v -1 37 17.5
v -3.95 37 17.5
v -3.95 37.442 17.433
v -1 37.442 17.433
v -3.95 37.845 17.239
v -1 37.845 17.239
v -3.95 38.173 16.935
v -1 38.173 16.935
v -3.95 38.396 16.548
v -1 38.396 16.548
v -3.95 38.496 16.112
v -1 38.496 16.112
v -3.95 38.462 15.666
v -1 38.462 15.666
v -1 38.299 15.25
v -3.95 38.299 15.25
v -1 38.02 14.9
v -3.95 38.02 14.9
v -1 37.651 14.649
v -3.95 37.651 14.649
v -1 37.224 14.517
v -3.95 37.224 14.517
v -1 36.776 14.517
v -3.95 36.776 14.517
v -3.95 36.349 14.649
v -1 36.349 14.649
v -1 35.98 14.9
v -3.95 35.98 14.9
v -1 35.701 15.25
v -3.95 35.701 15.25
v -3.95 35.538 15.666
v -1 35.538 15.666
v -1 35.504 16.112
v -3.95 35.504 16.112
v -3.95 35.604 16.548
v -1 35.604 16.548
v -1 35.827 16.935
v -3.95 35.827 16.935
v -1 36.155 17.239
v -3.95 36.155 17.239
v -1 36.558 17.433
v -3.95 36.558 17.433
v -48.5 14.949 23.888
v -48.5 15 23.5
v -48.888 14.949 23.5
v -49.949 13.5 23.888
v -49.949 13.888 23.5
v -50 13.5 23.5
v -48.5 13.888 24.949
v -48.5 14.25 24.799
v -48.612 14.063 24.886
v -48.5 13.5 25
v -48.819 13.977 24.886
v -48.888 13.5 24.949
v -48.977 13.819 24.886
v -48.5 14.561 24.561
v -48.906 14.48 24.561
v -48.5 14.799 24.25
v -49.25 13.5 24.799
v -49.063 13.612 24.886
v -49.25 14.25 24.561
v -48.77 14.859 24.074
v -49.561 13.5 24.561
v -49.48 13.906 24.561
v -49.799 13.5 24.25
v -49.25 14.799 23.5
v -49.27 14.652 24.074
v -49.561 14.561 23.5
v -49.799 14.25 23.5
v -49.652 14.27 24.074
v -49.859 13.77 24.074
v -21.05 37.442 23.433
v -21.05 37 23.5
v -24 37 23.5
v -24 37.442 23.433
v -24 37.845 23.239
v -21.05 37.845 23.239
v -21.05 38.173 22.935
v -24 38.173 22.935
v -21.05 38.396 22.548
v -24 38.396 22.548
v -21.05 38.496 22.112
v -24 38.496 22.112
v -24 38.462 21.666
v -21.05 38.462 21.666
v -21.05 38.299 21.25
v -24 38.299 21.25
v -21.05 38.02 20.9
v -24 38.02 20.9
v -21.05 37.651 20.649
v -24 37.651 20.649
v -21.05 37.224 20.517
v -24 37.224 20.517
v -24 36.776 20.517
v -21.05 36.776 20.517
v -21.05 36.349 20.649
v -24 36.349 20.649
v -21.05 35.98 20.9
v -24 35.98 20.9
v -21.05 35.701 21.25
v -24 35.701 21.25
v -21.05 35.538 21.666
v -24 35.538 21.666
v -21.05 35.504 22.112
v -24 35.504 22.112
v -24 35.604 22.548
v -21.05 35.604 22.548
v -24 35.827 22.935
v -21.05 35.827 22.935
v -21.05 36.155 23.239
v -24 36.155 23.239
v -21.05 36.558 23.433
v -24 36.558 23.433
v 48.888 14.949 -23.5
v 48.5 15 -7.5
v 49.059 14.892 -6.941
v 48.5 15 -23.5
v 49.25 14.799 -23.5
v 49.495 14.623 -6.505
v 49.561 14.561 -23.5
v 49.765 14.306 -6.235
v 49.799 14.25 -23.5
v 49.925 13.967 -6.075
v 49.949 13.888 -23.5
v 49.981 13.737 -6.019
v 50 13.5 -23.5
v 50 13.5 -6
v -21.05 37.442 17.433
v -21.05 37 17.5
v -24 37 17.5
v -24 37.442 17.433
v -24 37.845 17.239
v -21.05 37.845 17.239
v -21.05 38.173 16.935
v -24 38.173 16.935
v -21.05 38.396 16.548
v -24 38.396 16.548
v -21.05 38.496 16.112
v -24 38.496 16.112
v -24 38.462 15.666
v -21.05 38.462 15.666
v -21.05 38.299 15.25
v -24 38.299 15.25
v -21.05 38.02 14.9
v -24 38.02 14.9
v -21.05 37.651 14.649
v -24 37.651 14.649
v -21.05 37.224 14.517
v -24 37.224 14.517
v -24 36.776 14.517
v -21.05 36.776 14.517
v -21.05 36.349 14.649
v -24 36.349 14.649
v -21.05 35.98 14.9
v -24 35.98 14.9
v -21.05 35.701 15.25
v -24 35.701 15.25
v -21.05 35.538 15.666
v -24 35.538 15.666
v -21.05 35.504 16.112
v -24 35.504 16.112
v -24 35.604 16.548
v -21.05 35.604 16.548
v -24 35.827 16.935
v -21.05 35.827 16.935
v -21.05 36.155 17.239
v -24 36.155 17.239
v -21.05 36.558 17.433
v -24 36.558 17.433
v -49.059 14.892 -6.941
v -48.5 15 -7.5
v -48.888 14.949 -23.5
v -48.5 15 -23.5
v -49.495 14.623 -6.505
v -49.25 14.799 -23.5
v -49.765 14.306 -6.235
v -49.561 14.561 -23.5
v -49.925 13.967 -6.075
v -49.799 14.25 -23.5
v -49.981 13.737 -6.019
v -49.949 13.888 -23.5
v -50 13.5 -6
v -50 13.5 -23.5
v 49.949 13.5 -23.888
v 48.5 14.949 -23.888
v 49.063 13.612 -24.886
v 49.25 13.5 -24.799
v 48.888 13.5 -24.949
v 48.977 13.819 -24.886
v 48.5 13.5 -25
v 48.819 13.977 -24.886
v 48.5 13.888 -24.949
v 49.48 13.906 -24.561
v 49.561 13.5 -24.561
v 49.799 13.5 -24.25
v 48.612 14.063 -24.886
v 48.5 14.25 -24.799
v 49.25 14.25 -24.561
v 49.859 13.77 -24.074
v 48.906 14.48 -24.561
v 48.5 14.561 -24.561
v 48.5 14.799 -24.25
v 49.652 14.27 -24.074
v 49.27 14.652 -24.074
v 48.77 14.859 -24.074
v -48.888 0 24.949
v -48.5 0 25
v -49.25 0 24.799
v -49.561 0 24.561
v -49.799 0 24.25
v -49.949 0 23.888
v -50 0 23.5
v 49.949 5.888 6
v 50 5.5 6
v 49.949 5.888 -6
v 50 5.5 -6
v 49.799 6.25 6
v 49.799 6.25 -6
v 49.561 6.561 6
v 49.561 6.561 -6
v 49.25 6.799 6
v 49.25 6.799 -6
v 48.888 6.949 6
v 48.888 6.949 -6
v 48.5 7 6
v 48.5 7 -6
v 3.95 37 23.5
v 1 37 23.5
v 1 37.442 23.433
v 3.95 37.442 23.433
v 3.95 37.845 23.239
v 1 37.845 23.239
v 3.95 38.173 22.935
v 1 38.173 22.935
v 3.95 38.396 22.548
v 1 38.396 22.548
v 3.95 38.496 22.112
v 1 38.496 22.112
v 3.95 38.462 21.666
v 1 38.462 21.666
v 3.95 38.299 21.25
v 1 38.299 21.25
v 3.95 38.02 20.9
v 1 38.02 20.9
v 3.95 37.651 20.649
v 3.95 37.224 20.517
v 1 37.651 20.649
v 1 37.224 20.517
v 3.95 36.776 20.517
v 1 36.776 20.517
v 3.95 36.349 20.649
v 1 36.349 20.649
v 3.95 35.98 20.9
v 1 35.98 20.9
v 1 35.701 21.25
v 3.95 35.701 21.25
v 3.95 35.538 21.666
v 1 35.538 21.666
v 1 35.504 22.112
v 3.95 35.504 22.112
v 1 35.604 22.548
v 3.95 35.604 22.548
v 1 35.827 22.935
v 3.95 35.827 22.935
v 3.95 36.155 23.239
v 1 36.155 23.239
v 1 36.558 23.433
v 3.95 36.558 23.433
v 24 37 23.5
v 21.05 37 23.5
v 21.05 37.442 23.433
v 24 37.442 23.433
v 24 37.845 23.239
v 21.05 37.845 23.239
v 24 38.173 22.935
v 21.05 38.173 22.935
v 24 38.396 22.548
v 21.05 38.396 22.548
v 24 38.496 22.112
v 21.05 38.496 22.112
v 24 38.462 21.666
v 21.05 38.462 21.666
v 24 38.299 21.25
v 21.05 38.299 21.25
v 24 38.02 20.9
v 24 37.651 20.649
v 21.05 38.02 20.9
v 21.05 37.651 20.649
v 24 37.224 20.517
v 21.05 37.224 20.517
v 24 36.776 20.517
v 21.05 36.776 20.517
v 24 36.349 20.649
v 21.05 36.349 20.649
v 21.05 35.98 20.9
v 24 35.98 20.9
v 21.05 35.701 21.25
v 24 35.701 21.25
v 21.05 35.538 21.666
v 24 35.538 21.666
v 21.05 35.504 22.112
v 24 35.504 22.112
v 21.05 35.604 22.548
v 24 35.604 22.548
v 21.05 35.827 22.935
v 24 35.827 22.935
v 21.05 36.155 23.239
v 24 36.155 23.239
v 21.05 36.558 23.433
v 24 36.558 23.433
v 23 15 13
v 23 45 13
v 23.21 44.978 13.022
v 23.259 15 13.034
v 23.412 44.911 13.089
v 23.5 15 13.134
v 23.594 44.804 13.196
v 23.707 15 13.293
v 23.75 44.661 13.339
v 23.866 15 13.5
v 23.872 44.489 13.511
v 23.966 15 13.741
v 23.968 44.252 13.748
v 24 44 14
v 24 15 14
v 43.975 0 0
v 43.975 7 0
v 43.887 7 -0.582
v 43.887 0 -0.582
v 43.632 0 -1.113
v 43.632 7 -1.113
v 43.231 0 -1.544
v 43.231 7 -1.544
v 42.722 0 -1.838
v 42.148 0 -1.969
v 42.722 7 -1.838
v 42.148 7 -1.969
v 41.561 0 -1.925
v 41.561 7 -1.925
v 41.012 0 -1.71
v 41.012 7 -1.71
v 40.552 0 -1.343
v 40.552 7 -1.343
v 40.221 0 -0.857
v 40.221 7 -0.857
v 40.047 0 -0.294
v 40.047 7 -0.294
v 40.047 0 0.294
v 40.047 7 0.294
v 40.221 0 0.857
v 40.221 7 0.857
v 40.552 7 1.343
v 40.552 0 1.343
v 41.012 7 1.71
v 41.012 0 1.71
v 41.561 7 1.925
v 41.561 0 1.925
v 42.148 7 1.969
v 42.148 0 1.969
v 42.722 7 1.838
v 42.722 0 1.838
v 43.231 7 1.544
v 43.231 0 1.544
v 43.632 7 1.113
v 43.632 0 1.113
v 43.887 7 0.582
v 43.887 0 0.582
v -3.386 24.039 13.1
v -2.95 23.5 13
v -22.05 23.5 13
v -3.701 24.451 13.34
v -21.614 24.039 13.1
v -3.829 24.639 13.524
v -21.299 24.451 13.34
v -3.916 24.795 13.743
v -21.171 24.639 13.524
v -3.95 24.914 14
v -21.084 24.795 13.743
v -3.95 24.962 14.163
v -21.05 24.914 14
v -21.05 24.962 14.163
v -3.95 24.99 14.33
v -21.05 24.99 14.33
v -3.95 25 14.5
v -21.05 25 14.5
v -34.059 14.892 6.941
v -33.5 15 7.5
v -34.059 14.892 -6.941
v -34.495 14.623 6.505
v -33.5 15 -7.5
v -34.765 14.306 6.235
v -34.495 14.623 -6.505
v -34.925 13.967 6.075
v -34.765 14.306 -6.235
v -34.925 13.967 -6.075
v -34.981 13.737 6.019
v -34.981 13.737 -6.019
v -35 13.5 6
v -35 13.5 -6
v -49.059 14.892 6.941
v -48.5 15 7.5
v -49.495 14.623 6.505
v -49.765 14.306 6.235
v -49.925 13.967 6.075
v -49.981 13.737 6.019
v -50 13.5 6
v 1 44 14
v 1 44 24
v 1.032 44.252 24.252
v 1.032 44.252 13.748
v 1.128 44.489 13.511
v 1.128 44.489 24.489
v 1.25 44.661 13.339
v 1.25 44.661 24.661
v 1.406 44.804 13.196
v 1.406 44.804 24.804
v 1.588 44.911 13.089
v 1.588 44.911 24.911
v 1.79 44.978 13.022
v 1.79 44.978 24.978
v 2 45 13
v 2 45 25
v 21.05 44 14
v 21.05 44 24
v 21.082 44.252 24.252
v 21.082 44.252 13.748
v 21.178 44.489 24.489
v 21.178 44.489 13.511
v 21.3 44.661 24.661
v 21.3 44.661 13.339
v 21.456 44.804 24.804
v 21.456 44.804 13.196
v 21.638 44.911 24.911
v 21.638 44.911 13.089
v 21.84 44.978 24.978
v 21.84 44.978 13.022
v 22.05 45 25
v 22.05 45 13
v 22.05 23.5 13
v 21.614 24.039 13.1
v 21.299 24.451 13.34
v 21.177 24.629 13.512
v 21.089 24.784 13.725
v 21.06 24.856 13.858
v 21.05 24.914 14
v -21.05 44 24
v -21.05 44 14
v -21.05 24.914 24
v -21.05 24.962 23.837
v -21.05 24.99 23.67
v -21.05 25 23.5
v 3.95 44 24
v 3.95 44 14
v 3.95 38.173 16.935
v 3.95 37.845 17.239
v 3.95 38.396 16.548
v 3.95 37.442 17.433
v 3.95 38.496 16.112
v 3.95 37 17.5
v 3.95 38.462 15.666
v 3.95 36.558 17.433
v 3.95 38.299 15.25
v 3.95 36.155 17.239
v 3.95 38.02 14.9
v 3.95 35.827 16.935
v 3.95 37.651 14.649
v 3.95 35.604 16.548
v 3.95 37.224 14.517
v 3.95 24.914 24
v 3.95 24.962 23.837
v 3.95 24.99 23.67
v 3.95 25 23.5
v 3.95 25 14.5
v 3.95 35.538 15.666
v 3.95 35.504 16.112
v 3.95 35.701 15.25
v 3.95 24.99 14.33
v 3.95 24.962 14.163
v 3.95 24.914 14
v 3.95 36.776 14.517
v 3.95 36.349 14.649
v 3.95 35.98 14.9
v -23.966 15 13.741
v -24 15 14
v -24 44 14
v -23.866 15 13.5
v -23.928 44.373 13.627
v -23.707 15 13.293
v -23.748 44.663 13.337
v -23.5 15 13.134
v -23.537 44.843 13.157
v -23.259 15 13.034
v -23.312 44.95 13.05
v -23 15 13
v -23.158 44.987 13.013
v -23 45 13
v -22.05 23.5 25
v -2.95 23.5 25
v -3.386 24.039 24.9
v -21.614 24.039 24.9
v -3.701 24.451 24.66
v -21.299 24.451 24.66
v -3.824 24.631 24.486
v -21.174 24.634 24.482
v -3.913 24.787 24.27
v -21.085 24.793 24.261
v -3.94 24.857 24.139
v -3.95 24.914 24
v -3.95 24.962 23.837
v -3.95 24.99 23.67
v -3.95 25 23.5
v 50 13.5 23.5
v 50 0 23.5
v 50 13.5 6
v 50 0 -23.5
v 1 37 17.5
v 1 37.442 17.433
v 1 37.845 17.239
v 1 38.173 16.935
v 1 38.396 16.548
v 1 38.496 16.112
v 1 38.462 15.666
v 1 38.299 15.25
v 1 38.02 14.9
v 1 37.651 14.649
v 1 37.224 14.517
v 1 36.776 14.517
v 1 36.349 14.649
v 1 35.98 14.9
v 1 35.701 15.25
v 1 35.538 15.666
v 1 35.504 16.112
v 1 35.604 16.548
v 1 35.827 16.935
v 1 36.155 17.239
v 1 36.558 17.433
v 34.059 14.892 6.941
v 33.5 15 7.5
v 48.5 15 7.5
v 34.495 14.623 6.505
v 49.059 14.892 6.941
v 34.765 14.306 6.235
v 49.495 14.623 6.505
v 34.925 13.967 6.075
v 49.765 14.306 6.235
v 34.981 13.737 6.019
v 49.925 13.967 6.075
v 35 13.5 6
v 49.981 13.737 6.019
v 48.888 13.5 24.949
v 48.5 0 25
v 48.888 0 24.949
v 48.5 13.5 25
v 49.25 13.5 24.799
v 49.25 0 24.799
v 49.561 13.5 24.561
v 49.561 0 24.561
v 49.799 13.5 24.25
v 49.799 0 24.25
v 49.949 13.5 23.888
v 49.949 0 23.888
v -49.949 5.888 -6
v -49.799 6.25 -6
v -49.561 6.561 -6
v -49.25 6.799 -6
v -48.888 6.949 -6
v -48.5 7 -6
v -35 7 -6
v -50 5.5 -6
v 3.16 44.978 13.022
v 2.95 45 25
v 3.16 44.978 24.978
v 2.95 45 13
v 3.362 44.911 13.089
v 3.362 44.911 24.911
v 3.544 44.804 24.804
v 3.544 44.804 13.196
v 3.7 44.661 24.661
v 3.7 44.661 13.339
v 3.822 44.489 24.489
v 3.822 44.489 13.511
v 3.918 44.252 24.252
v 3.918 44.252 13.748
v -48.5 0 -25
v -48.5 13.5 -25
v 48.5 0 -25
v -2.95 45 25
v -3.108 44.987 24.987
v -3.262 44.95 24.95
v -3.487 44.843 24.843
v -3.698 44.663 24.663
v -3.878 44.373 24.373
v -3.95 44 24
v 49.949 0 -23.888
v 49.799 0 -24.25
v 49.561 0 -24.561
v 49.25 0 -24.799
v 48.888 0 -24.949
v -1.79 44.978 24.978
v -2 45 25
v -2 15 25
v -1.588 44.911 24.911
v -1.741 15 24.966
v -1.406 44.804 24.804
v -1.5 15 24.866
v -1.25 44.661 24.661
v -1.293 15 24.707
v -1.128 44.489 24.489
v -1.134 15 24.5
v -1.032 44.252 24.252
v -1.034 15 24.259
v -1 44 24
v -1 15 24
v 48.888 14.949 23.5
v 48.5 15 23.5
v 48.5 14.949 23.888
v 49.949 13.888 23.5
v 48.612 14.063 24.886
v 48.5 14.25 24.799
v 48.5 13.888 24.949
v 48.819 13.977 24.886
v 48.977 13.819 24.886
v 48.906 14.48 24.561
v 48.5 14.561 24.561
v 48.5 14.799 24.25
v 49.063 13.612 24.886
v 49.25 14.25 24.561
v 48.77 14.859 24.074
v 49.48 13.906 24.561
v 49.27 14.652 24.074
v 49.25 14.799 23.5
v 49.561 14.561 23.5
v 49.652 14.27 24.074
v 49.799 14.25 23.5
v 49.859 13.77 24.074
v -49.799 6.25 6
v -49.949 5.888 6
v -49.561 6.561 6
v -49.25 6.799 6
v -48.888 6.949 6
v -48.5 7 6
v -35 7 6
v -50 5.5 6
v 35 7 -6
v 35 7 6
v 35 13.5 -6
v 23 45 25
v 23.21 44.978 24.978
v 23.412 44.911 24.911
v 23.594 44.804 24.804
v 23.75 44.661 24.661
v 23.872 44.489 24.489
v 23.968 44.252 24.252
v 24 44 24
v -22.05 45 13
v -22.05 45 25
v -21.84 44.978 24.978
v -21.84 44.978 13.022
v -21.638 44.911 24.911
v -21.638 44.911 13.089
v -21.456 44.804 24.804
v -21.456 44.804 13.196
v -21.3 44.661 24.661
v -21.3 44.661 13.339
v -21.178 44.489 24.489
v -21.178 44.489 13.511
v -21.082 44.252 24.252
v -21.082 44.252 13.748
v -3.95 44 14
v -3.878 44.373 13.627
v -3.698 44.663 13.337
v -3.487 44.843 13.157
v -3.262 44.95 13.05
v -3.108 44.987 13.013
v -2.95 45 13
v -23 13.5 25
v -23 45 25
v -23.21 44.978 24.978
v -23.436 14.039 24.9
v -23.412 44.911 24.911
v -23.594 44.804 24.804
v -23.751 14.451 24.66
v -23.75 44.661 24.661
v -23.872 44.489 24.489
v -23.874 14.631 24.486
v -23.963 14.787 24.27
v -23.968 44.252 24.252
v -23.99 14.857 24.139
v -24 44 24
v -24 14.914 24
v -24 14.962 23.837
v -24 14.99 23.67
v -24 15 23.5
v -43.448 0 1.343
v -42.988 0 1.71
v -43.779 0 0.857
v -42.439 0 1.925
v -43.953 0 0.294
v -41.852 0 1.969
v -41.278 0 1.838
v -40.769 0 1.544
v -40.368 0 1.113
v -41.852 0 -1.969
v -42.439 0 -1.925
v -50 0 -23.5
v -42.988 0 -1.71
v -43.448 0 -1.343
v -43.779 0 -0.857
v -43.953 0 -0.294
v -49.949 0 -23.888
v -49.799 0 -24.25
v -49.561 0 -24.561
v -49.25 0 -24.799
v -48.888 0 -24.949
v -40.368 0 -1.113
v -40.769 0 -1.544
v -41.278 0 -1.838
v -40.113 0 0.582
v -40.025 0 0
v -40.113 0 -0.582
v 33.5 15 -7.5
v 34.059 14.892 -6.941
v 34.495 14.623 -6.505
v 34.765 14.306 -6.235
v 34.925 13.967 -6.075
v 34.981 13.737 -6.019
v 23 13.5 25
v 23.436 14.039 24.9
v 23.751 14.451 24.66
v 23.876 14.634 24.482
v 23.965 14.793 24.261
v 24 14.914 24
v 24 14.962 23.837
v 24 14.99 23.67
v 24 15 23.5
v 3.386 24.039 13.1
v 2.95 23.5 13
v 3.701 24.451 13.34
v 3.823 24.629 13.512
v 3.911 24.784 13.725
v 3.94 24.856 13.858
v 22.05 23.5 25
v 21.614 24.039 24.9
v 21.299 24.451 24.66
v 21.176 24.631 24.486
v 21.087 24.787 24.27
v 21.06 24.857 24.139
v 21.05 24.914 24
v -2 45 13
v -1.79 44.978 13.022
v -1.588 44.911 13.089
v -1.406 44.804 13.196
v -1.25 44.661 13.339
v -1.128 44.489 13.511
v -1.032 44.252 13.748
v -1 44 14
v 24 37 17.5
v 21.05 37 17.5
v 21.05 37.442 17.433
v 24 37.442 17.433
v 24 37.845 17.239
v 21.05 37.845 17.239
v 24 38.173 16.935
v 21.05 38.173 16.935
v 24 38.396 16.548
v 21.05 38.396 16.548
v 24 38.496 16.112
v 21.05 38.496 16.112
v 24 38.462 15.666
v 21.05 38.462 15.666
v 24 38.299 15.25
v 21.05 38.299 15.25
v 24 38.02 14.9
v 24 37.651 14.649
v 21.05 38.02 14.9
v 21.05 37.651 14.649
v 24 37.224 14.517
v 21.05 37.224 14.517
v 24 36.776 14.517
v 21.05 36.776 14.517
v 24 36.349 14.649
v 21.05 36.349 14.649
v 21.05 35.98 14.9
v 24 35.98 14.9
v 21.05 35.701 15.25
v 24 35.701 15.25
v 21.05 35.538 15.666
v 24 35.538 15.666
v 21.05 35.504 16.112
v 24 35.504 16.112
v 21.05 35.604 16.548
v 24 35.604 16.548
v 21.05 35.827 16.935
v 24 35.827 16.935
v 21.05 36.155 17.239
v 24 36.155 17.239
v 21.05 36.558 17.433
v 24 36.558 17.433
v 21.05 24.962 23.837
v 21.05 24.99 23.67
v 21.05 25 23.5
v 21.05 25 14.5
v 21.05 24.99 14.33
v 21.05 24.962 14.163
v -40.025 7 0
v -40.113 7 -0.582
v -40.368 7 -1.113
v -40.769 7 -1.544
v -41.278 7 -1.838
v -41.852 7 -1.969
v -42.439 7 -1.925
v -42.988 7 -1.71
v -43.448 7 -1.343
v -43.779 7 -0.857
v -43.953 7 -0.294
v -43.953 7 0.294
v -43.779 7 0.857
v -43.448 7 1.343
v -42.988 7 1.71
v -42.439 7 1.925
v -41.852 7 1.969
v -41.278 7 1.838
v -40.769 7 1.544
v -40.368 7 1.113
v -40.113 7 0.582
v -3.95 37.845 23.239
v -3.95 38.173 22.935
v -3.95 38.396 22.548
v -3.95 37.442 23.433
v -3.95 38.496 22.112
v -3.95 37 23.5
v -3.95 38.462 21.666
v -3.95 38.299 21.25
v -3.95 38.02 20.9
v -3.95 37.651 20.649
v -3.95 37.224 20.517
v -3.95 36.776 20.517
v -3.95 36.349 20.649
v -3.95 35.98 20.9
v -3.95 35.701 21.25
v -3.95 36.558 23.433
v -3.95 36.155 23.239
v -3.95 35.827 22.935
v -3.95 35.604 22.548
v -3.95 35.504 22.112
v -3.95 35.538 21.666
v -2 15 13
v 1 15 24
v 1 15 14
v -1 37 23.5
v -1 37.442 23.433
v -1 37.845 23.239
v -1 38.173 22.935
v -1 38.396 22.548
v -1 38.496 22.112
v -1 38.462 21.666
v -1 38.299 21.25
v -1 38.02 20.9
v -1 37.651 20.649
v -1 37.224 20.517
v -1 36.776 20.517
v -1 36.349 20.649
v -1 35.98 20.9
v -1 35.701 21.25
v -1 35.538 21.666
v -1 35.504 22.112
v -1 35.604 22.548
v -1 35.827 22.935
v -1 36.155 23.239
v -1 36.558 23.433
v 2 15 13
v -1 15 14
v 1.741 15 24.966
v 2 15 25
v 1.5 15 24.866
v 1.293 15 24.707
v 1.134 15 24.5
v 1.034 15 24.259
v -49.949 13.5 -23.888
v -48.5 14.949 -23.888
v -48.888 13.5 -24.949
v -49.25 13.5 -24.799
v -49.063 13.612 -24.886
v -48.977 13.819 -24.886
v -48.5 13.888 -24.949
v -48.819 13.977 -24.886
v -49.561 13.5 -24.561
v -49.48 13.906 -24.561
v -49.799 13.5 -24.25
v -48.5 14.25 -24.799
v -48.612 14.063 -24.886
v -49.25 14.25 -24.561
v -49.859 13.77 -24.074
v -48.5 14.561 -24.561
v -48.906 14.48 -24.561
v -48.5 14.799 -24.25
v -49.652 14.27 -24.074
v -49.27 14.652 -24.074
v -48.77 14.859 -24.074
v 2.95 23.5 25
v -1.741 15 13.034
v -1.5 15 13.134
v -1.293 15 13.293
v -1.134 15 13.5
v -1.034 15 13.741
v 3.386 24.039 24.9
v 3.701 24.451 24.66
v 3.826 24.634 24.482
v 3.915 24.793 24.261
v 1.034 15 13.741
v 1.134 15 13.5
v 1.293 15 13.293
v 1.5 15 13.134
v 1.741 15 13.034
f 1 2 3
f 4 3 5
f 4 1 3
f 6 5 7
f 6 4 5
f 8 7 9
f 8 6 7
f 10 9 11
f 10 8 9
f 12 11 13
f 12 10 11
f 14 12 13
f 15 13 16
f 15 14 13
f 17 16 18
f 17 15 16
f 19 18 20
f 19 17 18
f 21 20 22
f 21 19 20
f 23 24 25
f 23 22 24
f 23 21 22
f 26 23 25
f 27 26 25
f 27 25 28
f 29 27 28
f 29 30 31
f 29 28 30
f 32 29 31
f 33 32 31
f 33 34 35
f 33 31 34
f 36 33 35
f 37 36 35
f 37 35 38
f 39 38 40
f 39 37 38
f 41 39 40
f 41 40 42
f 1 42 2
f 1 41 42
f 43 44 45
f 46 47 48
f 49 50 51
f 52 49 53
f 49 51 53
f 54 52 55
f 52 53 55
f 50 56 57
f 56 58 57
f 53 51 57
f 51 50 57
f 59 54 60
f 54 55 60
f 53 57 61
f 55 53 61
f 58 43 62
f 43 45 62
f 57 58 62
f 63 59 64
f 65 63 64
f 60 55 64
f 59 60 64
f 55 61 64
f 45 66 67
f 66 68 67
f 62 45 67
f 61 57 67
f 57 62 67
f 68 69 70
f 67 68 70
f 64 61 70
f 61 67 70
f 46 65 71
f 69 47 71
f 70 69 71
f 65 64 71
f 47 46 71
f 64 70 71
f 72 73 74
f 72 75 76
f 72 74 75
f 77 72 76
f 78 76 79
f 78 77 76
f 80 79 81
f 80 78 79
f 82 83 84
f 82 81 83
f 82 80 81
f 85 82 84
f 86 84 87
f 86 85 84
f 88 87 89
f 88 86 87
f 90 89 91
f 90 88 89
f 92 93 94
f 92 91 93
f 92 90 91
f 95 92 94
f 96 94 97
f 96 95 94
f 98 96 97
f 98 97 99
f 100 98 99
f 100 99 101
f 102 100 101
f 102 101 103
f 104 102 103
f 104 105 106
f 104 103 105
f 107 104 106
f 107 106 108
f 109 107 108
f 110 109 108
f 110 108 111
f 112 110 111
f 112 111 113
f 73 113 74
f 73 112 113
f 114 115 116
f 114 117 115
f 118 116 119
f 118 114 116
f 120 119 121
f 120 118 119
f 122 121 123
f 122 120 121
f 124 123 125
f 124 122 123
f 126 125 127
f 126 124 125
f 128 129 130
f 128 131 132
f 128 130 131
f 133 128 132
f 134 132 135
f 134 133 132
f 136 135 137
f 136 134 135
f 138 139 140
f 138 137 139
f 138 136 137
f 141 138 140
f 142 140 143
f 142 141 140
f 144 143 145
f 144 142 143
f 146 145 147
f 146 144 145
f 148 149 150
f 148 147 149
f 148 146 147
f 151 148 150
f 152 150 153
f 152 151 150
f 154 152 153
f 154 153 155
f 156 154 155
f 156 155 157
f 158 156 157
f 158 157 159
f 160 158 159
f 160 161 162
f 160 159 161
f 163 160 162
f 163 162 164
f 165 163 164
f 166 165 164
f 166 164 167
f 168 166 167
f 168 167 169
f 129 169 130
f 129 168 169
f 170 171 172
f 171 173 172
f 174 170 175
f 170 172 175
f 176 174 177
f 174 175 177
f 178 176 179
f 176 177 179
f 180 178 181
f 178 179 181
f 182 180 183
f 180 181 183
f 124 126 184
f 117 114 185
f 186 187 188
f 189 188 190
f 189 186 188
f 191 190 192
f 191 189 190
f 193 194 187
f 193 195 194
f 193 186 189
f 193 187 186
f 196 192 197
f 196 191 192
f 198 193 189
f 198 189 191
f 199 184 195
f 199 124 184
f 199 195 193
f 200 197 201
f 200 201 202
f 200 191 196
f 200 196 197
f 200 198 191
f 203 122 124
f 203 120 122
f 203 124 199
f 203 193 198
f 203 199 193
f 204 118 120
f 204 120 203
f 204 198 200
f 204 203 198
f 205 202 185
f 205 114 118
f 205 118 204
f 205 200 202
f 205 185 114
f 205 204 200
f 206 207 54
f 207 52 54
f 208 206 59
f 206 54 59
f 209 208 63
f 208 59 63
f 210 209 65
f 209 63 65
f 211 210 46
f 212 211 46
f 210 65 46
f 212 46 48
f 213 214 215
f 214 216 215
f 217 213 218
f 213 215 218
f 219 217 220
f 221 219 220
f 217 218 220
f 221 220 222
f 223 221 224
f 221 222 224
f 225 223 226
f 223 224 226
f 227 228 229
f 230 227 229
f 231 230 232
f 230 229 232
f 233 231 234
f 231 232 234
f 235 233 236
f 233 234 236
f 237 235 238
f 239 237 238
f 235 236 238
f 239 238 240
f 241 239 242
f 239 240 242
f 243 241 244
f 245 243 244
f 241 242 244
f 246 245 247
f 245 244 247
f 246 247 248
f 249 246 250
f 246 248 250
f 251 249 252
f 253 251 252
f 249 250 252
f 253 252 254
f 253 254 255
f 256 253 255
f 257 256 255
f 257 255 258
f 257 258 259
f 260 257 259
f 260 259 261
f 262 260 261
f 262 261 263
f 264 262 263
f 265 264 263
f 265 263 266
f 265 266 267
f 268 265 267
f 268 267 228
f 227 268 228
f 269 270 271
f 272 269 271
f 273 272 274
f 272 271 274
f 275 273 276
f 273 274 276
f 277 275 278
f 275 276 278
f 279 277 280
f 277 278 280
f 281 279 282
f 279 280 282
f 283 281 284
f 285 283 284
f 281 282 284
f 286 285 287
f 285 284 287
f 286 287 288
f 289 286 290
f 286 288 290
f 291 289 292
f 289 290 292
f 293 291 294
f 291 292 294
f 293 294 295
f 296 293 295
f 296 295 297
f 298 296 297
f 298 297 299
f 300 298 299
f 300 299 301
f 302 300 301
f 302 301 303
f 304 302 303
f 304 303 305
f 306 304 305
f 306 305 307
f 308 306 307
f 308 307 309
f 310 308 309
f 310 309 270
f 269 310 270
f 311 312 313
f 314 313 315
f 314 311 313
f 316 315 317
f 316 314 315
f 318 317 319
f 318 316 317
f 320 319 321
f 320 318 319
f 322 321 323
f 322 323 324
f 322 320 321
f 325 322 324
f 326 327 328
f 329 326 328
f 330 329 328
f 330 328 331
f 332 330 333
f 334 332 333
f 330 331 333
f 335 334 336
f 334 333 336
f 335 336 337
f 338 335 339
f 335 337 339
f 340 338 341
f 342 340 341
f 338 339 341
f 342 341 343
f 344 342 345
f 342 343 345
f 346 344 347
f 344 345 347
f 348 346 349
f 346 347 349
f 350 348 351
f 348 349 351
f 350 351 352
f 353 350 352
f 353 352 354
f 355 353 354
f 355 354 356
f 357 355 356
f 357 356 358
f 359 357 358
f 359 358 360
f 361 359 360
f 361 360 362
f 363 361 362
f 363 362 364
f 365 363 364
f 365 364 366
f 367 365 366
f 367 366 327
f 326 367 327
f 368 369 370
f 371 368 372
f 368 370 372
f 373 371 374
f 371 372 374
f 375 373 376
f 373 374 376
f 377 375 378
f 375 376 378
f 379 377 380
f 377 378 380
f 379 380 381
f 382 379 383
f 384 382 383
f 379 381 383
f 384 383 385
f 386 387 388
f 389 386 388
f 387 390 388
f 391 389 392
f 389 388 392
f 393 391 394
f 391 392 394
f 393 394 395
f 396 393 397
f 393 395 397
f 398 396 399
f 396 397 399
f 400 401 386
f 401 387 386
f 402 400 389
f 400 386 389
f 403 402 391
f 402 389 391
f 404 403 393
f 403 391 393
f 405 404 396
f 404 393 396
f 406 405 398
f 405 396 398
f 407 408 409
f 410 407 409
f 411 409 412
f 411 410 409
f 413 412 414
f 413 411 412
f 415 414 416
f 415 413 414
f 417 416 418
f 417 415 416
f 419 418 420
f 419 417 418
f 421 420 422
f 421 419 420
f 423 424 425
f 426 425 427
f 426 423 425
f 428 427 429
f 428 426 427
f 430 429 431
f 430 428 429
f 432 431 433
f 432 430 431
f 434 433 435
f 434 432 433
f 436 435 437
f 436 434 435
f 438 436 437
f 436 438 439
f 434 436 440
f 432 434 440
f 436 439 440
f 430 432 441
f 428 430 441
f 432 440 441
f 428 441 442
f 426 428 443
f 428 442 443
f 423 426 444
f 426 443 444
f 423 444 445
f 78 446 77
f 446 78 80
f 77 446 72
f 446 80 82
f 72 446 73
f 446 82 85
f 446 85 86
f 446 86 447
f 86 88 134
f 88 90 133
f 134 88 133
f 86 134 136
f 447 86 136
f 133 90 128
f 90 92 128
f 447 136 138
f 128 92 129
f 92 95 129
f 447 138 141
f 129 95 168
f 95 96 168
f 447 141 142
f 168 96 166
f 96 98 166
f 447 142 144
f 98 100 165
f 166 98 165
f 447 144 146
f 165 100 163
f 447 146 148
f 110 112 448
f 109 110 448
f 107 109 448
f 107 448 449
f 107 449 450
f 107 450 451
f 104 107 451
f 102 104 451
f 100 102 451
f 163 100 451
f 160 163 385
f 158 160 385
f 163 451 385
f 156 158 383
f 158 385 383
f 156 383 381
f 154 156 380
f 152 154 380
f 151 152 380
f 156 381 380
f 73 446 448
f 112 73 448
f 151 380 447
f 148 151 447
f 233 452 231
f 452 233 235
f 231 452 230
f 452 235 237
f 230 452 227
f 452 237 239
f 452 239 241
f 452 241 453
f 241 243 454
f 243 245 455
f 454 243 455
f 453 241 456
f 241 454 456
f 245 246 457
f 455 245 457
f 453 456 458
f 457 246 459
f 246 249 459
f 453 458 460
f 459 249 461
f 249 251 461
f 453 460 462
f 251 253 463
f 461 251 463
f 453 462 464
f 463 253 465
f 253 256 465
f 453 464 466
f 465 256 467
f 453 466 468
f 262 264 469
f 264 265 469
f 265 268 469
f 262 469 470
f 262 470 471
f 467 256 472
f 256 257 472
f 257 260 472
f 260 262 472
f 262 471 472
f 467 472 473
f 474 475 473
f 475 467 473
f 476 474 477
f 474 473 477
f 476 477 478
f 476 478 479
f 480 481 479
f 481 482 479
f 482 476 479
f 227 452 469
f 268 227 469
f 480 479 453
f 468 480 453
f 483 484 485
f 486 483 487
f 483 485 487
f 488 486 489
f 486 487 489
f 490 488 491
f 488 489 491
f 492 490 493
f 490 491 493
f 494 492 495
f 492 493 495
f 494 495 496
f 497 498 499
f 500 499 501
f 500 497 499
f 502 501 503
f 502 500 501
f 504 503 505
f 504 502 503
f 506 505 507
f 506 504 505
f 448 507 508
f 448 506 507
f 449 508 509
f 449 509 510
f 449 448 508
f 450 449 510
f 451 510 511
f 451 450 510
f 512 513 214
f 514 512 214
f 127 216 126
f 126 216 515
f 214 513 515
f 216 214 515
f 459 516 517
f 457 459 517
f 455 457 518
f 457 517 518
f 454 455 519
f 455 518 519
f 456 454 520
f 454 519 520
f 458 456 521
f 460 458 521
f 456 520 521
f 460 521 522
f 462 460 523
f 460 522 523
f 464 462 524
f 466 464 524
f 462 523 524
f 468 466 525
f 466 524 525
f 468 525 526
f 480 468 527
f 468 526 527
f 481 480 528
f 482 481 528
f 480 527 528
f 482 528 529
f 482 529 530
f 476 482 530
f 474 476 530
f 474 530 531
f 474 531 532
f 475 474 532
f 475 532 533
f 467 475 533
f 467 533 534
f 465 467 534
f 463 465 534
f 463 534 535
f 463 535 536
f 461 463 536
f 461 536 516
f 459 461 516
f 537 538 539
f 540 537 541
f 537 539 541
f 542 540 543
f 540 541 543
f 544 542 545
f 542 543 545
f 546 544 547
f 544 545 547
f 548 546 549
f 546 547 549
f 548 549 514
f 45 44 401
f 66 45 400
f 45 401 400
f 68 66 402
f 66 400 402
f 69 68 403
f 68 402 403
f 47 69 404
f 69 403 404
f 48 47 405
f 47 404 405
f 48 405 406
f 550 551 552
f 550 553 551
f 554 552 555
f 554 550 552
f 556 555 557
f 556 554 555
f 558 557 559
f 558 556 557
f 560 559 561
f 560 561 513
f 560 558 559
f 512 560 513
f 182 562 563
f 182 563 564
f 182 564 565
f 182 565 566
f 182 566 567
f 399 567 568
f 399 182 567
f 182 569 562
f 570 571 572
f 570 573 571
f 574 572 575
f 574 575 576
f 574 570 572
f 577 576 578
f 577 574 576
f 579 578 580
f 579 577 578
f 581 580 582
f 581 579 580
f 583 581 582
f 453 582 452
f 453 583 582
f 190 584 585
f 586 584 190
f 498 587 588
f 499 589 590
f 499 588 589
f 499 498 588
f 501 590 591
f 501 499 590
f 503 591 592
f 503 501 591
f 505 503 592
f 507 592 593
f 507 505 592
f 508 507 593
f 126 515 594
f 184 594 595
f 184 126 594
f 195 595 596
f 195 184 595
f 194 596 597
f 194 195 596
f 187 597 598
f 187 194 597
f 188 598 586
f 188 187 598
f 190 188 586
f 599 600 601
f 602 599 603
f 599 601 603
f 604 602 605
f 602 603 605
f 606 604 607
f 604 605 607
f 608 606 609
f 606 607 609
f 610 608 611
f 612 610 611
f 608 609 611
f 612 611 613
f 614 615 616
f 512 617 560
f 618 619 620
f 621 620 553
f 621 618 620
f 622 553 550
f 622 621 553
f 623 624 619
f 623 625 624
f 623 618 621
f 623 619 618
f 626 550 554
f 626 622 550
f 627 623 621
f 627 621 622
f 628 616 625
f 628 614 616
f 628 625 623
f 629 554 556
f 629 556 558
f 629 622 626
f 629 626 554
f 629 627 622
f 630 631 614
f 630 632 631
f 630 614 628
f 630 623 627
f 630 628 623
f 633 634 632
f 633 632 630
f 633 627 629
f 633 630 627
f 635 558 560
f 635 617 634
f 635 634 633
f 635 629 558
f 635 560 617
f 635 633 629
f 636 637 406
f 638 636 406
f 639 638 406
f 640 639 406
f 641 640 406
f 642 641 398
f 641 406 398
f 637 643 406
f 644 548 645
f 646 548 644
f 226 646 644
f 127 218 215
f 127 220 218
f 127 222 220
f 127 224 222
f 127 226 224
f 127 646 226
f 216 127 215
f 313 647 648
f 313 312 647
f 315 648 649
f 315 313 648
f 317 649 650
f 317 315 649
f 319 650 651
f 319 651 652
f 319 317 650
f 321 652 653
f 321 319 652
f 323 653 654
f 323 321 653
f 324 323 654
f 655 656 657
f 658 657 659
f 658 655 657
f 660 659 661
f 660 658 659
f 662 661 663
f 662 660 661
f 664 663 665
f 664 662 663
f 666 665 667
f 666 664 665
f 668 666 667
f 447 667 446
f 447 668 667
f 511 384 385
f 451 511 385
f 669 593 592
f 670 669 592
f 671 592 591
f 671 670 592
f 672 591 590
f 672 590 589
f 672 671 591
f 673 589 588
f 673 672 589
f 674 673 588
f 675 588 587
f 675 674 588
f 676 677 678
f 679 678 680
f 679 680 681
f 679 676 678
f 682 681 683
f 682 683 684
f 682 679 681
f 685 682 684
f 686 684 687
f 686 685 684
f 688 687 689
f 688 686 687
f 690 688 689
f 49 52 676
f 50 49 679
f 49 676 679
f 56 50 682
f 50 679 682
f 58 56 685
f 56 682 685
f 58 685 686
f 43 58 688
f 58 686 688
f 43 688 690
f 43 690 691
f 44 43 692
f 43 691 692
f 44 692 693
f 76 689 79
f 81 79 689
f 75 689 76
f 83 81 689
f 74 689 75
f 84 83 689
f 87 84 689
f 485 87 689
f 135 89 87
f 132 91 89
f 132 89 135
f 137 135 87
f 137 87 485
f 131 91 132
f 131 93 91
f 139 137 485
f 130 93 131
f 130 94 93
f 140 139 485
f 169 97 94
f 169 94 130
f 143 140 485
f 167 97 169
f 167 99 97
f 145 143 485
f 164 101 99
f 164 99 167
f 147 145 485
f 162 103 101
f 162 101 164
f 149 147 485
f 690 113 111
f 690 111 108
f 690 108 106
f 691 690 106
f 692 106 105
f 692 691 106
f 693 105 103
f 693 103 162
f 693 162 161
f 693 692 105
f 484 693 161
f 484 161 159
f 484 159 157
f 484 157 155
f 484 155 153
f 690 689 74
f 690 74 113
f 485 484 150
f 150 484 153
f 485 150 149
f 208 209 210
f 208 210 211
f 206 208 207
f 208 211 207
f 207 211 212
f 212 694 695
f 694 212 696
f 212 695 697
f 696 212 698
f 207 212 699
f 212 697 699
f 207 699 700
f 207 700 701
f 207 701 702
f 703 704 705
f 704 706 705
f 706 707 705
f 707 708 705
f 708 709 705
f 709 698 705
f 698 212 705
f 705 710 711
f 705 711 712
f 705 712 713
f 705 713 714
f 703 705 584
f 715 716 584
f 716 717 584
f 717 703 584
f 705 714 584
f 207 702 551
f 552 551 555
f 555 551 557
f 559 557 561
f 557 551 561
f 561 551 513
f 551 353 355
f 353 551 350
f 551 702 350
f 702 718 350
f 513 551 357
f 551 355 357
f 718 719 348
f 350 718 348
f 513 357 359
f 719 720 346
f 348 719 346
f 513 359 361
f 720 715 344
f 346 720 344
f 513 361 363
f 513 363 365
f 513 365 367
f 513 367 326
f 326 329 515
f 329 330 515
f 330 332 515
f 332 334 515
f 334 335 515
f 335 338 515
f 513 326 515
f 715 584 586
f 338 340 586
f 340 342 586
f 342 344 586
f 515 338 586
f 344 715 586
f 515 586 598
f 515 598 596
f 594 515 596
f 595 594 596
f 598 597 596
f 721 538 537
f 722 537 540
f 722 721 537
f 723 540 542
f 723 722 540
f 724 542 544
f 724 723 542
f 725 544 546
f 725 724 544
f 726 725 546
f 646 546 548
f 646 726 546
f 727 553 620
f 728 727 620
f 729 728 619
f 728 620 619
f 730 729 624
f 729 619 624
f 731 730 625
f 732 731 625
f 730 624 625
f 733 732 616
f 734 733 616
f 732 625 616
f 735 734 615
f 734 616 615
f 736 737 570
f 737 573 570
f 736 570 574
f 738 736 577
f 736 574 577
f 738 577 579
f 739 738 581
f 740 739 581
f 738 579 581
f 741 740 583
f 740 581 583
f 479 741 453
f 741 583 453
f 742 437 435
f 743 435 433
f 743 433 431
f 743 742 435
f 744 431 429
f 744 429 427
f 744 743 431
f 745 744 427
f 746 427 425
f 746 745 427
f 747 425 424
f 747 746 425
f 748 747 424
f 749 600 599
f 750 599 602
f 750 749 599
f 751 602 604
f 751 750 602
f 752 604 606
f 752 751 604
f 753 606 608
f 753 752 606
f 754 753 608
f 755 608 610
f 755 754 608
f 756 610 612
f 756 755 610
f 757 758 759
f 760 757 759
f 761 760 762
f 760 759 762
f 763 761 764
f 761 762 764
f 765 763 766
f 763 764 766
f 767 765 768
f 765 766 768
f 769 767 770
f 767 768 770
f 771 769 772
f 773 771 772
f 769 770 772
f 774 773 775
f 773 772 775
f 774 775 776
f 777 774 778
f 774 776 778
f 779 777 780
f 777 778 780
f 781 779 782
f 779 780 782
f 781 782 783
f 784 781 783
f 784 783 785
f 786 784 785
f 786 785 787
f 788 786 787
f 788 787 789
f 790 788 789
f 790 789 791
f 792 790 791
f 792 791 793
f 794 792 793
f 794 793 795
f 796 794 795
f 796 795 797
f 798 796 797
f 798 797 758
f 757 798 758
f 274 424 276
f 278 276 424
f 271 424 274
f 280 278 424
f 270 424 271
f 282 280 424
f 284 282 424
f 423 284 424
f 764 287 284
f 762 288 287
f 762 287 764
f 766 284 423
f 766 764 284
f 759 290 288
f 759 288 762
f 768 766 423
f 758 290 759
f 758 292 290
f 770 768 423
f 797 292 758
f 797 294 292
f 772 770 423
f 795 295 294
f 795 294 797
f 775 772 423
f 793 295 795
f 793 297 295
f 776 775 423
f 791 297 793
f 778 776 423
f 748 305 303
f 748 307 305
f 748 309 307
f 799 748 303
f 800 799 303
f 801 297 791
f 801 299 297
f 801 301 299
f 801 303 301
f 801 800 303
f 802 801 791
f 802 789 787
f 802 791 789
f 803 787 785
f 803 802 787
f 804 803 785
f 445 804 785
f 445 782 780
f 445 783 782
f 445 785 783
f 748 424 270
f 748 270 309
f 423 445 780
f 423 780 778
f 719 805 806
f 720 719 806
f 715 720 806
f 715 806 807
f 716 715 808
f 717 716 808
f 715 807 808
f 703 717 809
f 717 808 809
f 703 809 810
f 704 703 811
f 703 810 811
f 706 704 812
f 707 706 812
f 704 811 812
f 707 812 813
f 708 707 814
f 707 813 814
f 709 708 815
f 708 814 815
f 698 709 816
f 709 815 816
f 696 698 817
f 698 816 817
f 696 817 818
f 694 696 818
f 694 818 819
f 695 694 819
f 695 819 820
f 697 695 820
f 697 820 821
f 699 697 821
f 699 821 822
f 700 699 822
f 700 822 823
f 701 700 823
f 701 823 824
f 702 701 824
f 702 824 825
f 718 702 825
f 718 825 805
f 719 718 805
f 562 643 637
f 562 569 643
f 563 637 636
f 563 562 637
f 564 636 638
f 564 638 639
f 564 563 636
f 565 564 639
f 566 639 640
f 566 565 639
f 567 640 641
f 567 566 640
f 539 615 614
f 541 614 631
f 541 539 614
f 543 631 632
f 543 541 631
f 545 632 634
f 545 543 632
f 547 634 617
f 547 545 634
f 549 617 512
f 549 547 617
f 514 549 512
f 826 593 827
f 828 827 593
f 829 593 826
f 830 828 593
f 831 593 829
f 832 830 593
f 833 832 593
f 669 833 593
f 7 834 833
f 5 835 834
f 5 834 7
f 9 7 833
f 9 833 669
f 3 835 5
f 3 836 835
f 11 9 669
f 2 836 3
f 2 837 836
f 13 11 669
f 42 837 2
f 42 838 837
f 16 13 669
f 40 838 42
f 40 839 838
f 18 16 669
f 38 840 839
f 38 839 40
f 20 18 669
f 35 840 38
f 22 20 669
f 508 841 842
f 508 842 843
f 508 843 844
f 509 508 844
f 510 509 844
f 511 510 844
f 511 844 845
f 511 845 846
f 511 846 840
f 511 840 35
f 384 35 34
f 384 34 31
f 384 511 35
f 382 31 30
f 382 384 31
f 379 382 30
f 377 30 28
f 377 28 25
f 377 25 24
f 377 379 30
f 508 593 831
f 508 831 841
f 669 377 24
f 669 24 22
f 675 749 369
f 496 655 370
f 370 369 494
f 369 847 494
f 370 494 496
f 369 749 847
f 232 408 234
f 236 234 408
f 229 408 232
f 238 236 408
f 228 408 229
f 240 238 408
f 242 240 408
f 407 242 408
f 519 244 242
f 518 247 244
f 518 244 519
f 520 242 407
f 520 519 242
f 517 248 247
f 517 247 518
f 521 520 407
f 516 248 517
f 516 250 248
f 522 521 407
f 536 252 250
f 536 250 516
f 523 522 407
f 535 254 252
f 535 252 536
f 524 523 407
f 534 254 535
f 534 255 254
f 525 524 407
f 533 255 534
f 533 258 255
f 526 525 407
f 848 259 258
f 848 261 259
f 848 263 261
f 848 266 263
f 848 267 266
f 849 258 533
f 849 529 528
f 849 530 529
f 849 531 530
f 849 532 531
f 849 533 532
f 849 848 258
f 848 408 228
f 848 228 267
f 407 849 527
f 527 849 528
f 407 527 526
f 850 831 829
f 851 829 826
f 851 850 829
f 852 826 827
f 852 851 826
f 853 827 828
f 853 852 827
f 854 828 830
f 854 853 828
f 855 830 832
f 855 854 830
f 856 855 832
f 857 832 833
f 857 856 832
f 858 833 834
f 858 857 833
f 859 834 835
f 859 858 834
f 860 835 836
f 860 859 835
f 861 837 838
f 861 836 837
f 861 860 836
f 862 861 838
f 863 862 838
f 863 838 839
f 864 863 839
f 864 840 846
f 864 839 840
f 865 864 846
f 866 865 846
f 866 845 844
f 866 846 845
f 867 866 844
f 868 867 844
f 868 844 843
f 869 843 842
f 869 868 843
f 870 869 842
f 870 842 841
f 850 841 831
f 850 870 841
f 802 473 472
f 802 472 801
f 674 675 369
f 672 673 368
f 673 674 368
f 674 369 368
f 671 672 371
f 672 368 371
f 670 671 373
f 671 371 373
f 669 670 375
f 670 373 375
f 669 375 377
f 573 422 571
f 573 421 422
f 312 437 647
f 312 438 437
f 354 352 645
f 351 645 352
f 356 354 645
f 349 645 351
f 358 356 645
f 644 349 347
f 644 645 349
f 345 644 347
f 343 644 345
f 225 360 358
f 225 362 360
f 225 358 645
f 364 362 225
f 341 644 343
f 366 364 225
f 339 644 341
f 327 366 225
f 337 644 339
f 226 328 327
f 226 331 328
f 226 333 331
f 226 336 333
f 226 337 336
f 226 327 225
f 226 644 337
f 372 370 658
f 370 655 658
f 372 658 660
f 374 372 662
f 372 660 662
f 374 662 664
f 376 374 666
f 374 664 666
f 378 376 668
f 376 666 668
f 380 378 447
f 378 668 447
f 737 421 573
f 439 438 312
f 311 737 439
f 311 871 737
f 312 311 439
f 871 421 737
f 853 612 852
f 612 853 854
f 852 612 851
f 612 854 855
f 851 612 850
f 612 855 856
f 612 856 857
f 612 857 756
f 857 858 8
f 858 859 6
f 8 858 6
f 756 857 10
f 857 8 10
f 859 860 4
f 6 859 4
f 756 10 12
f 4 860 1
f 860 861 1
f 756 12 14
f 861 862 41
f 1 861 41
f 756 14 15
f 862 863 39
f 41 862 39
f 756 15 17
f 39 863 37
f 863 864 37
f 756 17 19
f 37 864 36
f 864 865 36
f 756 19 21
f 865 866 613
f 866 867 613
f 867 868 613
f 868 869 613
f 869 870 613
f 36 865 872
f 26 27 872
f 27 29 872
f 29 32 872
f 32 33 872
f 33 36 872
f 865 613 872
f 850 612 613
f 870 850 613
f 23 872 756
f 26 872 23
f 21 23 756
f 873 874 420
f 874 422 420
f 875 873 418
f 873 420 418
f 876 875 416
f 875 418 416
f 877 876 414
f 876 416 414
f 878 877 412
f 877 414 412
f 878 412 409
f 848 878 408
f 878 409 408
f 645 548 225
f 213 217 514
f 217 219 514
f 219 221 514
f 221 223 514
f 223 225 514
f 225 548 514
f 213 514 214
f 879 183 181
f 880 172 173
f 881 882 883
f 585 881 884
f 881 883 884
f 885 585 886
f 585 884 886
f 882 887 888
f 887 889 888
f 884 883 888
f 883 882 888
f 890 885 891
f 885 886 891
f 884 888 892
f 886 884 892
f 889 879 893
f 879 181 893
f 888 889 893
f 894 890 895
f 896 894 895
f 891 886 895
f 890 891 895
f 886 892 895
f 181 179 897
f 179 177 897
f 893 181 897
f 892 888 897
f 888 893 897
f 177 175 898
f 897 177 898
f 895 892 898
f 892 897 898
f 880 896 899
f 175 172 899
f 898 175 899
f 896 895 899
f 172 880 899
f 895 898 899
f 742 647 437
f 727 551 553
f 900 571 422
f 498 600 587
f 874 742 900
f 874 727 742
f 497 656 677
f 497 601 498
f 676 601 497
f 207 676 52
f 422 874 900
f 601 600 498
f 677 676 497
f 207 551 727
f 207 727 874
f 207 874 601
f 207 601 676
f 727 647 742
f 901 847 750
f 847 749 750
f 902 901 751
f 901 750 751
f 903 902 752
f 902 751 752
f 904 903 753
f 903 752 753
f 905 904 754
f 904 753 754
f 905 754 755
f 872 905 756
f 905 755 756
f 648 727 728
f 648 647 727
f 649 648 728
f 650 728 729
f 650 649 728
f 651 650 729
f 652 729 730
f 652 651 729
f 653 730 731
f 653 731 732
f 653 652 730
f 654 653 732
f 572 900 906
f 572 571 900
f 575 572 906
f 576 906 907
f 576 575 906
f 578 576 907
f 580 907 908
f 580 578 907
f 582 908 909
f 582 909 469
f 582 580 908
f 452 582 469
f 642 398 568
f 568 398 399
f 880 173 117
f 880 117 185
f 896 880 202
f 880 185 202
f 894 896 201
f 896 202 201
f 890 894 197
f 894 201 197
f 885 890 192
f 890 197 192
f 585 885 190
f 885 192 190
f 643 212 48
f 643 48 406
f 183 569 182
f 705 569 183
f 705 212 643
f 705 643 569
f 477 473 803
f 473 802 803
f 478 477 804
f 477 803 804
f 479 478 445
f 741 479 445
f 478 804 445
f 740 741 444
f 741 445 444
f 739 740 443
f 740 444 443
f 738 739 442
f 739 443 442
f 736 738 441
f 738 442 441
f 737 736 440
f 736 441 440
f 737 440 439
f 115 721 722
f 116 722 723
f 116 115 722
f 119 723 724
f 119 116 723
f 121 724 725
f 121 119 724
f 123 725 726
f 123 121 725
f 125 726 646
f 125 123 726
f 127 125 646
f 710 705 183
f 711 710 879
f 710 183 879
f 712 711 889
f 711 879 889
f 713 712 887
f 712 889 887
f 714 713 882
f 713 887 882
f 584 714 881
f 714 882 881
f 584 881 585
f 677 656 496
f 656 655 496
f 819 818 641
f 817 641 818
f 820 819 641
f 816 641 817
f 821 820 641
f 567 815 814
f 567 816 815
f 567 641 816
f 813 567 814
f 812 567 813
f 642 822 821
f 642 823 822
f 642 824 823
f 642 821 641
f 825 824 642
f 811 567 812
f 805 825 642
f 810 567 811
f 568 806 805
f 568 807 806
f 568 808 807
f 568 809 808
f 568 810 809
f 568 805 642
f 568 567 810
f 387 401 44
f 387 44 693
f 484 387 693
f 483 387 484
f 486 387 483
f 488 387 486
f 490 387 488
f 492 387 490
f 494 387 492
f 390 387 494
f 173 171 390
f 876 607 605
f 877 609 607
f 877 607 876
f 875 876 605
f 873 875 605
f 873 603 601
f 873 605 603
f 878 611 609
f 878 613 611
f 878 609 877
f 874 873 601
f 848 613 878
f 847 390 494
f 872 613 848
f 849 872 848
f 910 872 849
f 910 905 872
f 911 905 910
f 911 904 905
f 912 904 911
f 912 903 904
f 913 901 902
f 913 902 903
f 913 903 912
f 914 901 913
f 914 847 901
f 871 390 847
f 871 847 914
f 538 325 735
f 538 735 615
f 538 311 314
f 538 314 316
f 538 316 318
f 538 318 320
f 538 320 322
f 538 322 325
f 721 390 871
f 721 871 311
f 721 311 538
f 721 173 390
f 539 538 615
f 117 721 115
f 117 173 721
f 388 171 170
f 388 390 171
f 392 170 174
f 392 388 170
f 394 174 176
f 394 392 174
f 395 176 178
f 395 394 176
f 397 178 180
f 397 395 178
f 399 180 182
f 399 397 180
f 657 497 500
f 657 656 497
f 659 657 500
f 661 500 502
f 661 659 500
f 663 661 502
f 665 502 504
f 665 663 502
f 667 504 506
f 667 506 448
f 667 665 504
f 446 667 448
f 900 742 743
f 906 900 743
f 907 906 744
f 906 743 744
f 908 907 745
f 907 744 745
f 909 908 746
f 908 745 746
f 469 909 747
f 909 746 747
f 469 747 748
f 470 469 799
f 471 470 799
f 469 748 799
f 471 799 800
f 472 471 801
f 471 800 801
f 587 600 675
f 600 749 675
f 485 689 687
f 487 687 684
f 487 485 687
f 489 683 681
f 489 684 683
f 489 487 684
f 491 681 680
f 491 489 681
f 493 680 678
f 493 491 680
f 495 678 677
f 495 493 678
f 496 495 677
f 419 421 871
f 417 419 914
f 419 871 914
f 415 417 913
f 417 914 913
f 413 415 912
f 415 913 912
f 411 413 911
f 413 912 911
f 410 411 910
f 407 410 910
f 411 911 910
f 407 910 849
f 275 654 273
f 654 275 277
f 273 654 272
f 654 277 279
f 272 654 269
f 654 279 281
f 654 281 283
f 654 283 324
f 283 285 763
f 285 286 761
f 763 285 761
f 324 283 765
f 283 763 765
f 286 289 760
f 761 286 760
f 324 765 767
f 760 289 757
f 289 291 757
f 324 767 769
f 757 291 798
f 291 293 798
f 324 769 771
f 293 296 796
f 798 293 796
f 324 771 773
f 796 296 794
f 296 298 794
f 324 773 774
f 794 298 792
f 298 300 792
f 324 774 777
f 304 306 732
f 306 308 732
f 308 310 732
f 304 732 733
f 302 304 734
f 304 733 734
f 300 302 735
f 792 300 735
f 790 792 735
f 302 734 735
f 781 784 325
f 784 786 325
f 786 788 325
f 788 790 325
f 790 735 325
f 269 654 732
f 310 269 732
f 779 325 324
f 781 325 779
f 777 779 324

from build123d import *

# Parameters (mm, degrees)
SKETCH1_W           = 100
SKETCH1_H           = 50
BOSS_EXTRUDE1_DEPTH = 15
SKETCH2_W           = 30
SKETCH2_H           = 12
CUT_EXTRUDE1_DEPTH  = 8
SKETCH7_W           = 23
SKETCH7_H           = 12
BOSS_EXTRUDE2_DEPTH = 10
SKETCH8_W           = 2.95
SKETCH8_H           = 12
BOSS_EXTRUDE3_DEPTH = 20
SKETCH10_R          = 1.5
CUT_EXTRUDE2_DEPTH  = 50
FILLET1_R           = 1.5
FILLET2_R           = 1
SKETCH11_R          = 1.975
CUT_EXTRUDE3_DEPTH  = 20
SKETCH12_R          = 1.975
CUT_EXTRUDE4_DEPTH  = 20


with BuildPart() as part:
    # Sketch1 → Boss-Extrude1 (new body)
    with BuildSketch(Plane(origin=(0, 0, 0), x_dir=(1, 0, 0), z_dir=(0, 1, 0))):
        Rectangle(SKETCH1_W, SKETCH1_H)
    extrude(amount=BOSS_EXTRUDE1_DEPTH)

    # Sketch2 → Cut-Extrude1 (cut)
    with BuildSketch(Plane(origin=(0, 15, 0), x_dir=(1, 0, 0), z_dir=(0, 1, 0))):
        with Locations((-50, 0)):
            Rectangle(SKETCH2_W, SKETCH2_H)
        with Locations((50, 0)):
            Rectangle(SKETCH2_W, SKETCH2_H)
    extrude(amount=-CUT_EXTRUDE1_DEPTH, mode=Mode.SUBTRACT)

    # Sketch7 → Boss-Extrude2 (add)
    with BuildSketch(Plane(origin=(0, 15, 0), x_dir=(1, 0, 0), z_dir=(0, 1, 0))):
        with Locations((12.5, -19)):
            Rectangle(SKETCH7_W, SKETCH7_H)
    boss_extrude2 = extrude(amount=BOSS_EXTRUDE2_DEPTH)

    # Sketch8 → Boss-Extrude3 (add)
    with BuildSketch(Plane(origin=(0, 25, 0), x_dir=(1, 0, 0), z_dir=(0, 1, 0))):
        with Locations((2.475, -19)):
            Rectangle(SKETCH8_W, SKETCH8_H)
        with Locations((22.525, -19)):
            Rectangle(SKETCH8_W, SKETCH8_H)
    boss_extrude3 = extrude(amount=BOSS_EXTRUDE3_DEPTH)

    # Sketch10 → Cut-Extrude2 (cut, through all)
    with BuildSketch(Plane.ZY.offset(-1)):
        with Locations((16, 37)):
            Circle(SKETCH10_R)
        with Locations((22, 37)):
            Circle(SKETCH10_R)
    cut_extrude2 = extrude(amount=-CUT_EXTRUDE2_DEPTH, mode=Mode.SUBTRACT)

    # Mirror1: Boss-Extrude2, Boss-Extrude3, Cut-Extrude2 across plane
    add(boss_extrude2.mirror(Plane(origin=(0, 0, 0), x_dir=(0, 0, 1), z_dir=(1, 0, 0))))
    add(boss_extrude3.mirror(Plane(origin=(0, 0, 0), x_dir=(0, 0, 1), z_dir=(1, 0, 0))))
    add(cut_extrude2.mirror(Plane(origin=(0, 0, 0), x_dir=(0, 0, 1), z_dir=(1, 0, 0))), mode=Mode.SUBTRACT)

    # Fillet1
    fillet1_edges = [part.edges().sort_by_distance(p)[0] for p in [
        (-12.5, 25, 25),
        (-12.5, 25, 13),
        (-50, 15, -15.5),
        (50, 15, -15.5),
        (-50, 15, 15.5),
        (42.5, 15, -6),
        (-37, 15, 25),
        (-42.5, 15, 6),
        (-50, 7, 0),
        (50, 7, 0),
        (-35, 15, 0),
        (-42.5, 15, -6),
        (42.5, 15, 6),
        (35, 15, 0),
        (50, 15, 15.5),
        (37, 15, 25),
        (12.5, 25, 25),
        (12.5, 25, 13),
        (50, 7.5, 25),
        (-50, 7.5, 25),
        (-50, 7.5, -25),
        (50, 7.5, -25),
        (0, 15, -25),
    ]]
    fillet(fillet1_edges, radius=FILLET1_R)

    # Fillet2
    fillet2_edges = [part.edges().sort_by_distance(p)[0] for p in [
        (-24, 30, 13),
        (-24, 30, 25),
        (-1, 30, 25),
        (-1, 30, 13),
        (-3.95, 45, 19),
        (-3.95, 35, 13),
        (-3.95, 35, 25),
        (-1, 45, 19),
        (-21.05, 35, 13),
        (-24, 45, 19),
        (-21.05, 45, 19),
        (-21.05, 35, 25),
        (24, 30, 25),
        (24, 30, 13),
        (1, 30, 13),
        (1, 30, 25),
        (3.95, 35, 13),
        (3.95, 35, 25),
        (1, 45, 19),
        (3.95, 45, 19),
        (21.05, 35, 13),
        (21.05, 35, 25),
        (21.05, 45, 19),
        (24, 45, 19),
    ]]
    fillet(fillet2_edges, radius=FILLET2_R)

    # Sketch11 → Cut-Extrude3 (cut)
    with BuildSketch(Plane(origin=(0, 7, 0), x_dir=(1, 0, 0), z_dir=(0, 1, 0))):
        with Locations((42, 0)):
            Circle(SKETCH11_R)
    extrude(amount=-CUT_EXTRUDE3_DEPTH, mode=Mode.SUBTRACT)

    # Sketch12 → Cut-Extrude4 (cut)
    with BuildSketch(Plane(origin=(0, 7, 0), x_dir=(1, 0, 0), z_dir=(0, 1, 0))):
        with Locations((-42, 0)):
            Circle(SKETCH12_R)
    extrude(amount=-CUT_EXTRUDE4_DEPTH, mode=Mode.SUBTRACT)


solid = part.part
